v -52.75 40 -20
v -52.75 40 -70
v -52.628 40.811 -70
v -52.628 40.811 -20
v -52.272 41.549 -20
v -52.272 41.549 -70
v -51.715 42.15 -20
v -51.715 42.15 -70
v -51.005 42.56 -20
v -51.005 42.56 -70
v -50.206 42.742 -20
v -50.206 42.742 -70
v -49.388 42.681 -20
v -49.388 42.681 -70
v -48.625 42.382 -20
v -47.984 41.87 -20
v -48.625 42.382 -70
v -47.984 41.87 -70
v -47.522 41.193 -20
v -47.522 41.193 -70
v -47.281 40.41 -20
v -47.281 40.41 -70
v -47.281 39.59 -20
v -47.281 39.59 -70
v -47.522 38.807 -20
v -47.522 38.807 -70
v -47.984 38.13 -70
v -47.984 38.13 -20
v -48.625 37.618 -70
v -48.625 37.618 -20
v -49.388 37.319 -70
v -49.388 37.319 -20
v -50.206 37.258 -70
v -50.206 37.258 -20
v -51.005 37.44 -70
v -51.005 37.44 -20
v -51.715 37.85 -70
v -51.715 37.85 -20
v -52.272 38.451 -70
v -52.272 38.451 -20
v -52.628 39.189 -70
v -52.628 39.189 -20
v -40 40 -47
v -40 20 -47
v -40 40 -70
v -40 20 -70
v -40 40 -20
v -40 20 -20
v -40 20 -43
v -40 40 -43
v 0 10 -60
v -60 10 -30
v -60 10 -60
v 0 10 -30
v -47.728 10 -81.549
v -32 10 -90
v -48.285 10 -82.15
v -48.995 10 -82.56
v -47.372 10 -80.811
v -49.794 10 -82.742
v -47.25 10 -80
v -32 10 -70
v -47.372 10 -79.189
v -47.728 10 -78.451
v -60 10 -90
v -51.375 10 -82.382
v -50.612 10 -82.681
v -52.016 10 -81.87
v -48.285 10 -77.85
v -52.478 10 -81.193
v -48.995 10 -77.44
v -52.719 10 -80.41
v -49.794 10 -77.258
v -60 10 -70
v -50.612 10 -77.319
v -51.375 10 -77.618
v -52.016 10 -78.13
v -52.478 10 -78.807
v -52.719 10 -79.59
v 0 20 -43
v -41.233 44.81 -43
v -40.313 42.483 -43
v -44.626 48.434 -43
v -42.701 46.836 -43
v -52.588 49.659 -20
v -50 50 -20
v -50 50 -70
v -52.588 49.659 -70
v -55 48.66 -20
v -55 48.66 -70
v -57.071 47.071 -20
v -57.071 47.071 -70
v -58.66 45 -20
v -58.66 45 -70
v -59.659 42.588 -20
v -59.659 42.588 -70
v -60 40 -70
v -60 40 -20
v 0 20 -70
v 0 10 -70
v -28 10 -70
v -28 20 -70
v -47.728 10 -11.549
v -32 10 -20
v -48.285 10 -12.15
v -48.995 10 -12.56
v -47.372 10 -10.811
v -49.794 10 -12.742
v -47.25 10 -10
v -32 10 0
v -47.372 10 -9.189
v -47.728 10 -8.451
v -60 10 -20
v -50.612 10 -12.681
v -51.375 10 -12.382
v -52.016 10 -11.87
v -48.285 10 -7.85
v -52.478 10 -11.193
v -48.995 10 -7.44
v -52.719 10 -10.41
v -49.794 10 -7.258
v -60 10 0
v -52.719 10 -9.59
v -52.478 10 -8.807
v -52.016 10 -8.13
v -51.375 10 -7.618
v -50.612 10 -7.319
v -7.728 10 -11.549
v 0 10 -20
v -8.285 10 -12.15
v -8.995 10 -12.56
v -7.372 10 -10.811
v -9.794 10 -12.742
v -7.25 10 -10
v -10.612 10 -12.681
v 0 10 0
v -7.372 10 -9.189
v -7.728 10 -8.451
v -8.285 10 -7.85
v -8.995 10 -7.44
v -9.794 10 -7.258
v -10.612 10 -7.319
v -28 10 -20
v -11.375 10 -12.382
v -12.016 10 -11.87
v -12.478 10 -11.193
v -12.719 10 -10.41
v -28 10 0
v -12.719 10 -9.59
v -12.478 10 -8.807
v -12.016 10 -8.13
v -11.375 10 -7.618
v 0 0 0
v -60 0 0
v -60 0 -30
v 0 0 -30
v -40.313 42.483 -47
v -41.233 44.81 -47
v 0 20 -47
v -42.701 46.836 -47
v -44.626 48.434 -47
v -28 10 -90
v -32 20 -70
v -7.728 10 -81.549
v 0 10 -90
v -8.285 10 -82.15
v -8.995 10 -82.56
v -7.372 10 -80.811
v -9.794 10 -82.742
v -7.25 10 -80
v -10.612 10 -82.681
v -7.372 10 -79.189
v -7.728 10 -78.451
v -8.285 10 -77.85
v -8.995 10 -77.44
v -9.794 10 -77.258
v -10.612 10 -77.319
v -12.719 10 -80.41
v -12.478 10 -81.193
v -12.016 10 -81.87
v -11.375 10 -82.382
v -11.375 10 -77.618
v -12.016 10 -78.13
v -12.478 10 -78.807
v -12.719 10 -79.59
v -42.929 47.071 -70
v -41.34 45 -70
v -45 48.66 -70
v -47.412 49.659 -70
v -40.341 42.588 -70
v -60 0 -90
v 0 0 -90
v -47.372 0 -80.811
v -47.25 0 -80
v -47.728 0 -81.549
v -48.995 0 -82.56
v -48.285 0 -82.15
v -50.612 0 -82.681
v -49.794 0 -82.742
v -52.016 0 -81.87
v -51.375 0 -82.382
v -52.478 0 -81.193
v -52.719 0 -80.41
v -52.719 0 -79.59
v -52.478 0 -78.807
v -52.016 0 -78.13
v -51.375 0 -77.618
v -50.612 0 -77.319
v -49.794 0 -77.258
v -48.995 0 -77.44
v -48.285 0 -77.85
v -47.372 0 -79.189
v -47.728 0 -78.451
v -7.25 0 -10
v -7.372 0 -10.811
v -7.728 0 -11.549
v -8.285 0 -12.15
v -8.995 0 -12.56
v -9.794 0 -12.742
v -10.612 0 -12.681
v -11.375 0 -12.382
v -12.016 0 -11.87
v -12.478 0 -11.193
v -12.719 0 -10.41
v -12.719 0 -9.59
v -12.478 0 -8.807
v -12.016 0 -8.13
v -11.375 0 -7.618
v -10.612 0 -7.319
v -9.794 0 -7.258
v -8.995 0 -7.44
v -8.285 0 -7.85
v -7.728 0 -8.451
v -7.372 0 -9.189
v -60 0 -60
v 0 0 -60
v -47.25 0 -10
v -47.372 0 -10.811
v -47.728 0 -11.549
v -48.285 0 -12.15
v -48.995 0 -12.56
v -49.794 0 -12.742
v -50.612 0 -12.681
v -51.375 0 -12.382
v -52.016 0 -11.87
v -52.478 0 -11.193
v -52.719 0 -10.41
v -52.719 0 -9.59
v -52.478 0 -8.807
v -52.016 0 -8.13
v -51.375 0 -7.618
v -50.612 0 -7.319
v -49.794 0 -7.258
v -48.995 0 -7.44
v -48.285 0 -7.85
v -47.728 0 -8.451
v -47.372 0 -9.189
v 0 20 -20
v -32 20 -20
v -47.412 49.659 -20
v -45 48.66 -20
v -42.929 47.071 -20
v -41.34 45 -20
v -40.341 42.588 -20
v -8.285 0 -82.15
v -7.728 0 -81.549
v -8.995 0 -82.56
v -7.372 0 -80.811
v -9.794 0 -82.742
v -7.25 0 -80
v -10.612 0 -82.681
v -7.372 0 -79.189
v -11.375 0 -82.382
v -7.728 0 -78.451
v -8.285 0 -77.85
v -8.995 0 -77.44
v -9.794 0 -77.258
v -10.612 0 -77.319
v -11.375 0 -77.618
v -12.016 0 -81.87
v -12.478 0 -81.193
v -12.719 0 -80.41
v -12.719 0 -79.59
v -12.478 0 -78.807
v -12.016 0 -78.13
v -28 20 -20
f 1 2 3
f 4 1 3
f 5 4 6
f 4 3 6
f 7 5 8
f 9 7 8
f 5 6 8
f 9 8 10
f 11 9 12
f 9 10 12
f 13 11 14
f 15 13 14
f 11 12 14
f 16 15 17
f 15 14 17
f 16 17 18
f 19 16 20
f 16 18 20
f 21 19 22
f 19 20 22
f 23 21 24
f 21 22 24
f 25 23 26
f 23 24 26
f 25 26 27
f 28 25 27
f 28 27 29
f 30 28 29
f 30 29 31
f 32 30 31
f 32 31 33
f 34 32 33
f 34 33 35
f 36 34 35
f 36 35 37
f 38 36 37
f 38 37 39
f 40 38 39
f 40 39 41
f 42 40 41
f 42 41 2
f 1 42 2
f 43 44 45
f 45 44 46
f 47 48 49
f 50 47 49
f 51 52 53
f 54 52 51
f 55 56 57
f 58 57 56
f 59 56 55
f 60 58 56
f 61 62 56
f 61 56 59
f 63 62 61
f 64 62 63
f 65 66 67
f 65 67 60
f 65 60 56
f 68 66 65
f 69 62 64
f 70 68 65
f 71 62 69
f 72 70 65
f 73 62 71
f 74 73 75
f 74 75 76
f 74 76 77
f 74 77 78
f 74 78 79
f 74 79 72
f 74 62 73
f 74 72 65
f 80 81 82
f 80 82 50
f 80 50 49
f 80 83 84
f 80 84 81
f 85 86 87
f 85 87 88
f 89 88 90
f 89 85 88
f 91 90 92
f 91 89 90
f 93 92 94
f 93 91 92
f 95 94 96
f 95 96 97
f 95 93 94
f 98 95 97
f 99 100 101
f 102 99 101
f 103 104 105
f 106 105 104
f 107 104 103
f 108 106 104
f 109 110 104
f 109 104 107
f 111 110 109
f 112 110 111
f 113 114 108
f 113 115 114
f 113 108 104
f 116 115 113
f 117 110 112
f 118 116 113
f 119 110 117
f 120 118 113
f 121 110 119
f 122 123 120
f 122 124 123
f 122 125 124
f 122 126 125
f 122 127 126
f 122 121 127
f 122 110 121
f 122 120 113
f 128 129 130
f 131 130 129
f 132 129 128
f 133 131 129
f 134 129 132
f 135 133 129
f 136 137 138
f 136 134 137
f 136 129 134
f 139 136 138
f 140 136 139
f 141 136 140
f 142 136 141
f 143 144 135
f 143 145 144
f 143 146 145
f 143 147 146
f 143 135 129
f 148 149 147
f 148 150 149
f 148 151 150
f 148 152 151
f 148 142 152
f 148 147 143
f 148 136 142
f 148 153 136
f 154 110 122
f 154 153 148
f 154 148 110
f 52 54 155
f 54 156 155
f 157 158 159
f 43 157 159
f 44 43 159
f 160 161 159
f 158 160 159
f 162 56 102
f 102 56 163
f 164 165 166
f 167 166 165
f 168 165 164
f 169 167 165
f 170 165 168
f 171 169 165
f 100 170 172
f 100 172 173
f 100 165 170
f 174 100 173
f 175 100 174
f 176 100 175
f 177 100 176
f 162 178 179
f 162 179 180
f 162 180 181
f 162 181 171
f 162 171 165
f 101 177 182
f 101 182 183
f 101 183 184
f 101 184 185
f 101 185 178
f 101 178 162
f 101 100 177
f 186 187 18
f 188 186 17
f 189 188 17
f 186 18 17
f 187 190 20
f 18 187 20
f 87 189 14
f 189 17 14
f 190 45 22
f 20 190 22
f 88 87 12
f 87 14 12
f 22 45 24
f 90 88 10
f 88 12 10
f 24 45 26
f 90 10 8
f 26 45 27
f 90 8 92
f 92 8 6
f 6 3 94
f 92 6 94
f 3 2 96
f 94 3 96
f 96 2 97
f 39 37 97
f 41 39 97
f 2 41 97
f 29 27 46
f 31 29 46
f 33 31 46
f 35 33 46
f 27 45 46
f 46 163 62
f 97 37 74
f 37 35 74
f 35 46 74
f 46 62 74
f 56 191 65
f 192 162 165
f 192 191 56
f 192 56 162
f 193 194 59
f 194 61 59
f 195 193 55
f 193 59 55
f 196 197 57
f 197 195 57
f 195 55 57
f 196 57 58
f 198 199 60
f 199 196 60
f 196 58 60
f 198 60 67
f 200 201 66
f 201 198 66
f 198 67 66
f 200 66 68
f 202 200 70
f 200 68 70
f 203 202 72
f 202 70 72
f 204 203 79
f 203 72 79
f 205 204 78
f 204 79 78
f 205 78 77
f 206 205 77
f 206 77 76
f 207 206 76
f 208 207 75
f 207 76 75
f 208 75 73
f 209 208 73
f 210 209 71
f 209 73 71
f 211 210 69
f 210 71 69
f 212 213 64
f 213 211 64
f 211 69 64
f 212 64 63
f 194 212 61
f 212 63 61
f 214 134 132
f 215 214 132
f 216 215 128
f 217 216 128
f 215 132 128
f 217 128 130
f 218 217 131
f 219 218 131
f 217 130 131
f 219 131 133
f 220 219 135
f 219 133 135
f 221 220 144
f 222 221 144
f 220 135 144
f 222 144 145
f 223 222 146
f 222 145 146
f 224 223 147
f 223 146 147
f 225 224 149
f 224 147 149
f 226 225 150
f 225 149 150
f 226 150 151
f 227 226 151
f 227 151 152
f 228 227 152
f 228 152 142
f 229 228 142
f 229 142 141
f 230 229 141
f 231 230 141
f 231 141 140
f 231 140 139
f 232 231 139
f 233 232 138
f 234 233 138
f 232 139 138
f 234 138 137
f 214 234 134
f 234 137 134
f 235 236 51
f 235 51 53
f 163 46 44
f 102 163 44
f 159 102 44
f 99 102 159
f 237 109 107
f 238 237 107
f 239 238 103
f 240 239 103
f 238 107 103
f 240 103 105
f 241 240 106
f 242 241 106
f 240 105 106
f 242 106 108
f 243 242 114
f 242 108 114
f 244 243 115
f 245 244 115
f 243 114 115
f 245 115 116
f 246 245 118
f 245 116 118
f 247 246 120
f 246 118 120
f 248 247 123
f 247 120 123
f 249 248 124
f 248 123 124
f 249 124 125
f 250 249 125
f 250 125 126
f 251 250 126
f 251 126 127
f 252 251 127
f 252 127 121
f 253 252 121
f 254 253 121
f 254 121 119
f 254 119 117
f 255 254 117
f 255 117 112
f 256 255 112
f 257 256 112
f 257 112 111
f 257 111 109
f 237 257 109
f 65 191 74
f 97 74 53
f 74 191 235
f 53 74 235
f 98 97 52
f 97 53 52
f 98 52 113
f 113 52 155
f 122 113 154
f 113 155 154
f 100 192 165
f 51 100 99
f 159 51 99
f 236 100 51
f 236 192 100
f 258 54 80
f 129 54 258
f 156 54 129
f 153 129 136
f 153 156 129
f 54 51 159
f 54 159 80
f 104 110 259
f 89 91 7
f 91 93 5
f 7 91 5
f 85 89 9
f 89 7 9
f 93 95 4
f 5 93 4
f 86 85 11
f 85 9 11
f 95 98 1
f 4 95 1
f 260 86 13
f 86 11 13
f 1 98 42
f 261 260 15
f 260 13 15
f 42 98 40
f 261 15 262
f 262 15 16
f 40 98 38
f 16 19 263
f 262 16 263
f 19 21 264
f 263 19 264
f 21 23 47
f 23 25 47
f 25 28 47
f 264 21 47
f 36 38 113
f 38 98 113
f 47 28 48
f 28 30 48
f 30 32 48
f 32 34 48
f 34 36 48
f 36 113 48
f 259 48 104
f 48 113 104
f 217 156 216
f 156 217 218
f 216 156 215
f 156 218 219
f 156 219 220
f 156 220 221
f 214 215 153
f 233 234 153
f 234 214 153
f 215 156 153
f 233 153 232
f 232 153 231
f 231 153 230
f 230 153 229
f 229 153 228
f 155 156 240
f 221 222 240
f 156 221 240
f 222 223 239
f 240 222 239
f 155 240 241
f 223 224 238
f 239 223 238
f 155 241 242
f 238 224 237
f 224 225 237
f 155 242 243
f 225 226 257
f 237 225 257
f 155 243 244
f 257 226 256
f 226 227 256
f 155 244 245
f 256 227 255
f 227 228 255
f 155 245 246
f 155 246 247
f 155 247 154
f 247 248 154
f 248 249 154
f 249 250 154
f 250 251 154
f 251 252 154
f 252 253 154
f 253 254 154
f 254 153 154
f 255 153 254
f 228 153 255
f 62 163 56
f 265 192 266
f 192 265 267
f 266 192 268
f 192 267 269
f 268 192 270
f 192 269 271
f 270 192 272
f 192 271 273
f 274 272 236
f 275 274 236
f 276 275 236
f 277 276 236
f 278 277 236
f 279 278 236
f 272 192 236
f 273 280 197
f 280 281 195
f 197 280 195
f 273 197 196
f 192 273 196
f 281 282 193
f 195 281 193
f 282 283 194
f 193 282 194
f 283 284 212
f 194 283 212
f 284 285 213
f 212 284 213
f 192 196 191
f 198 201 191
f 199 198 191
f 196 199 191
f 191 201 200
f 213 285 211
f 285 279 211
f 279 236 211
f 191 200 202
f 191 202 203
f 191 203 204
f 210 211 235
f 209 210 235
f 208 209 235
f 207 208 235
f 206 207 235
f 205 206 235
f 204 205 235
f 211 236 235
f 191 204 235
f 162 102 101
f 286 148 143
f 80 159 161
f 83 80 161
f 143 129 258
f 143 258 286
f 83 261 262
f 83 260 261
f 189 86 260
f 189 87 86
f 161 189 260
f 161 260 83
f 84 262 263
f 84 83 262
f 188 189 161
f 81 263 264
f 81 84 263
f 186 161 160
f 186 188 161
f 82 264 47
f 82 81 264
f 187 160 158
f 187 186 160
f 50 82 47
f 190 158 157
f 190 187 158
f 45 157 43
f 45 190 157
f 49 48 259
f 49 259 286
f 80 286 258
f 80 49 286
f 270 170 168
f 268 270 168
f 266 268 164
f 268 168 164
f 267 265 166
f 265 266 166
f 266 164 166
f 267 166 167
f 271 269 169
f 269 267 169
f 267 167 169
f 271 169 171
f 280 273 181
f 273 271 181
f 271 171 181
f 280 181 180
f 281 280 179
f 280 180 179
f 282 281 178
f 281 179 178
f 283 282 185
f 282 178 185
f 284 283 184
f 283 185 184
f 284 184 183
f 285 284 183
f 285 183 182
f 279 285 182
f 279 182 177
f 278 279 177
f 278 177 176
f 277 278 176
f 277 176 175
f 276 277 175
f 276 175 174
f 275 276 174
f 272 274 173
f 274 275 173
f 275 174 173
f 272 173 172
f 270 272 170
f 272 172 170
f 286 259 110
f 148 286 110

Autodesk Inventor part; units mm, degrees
sketch "Sketch1" plane through (0, 0, 0) normal (0, 1, 0) x (-1, 0, 0)
  line L0 (0, 0) -> (60, 0)
  line L1 (60, 0) -> (60, -90)
  line L2 (60, -90) -> (0, -90)
  line L3 (0, -90) -> (0, 0)
  dimension "d0" = 60
  dimension "d1" = 90
extrude "Extrusion1" add sketch "Sketch1" along normal blind 10
sketch "Sketch2" plane through (0, 10, 0) normal (0, 1, 0) x (1, 0, 0)
  line L0 (0, 20) -> (-60, 20)
  line L1 (0, 70) -> (-60, 70)
  line L2 (-60, 70) -> (-60, 20)
  line L3 (0, 20) -> (0, 70)
  point P0 (0, 0)
extrude "Extrusion2" add sketch "Sketch2" along normal blind 10
sketch "Sketch3" plane through (0, 0, 0) normal (0, -1, 0) x (1, 0, 0)
  line L0 (0, -30) -> (-60, -30)
  line L1 (-60, -30) -> (-60, -60)
  line L2 (0, -90) -> (0, -60)
  line L3 (0, -60) -> (-60, -60)
  line L4 (0, -60) -> (0, -30)
  dimension "d9" = 30
extrude "Extrusion3" cut sketch "Sketch3" against normal blind 10
sketch "Sketch4" plane through (0, 10, 0) normal (0, 1, 0) x (1, 0, 0)
  circle A0 centre (-10, 10) radius 2.75
  circle A1 centre (-50, 10) radius 2.75
  dimension "d13" = 5.5
  dimension "d14" = 5.5
extrude "Extrusion4" cut sketch "Sketch4" against normal blind 10
ref_plane "Work Plane1" through (-30, 0, -90) normal (1, 0, 0) x (0, 0, -1)
sketch "Sketch5" plane through (-30, 0, -90) normal (1, 0, 0) x (0, 0, -1)
  line L0 (-70, 10) -> (-70, 20) projected
  line L1 (-90, 10) -> (-70, 10) projected
  line L2 (-70, 20) -> (-90, 10)
  line L3 (-90, 10) -> (-70, 10)
  line L4 (-70, 10) -> (-70, 20)
  point P0 (-90, 0)
extrude "Extrusion5" add sketch "Sketch5" along normal mid plane 4
ref_plane "Work Plane2" through (-60, 0, -45) normal (0, 0, 1) x (1, 0, 0)
mirror "Mirror1" about plane through (-60, 0, -45) normal (0, 0, 1) of "Extrusion4", "Extrusion5"
sketch "Sketch6" plane through (0, 20, 0) normal (0, 1, 0) x (1, 0, 0)
  line L0 (-32, 70) -> (-60, 70) projected
  line L1 (-40, 20) -> (-40, 70)
  line L2 (-60, 70) -> (-40, 70)
  line L3 (-60, 70) -> (-60, 20)
  line L4 (-60, 20) -> (-40, 20)
  point P0 (0, 0)
  point P1 (0, 20)
extrude "Extrusion6" add sketch "Sketch6" along normal blind 30
fillet "Fillet1" radius 10 2 edges at (-40, 50, -45) (-60, 50, -45)
sketch "Sketch7" plane through (-32, 10, -70) normal (0, 0, -1) x (-1, 0, 0)
  arc A0 (28, 30) -> (8, 30) centre (18, 30) ccw projected
  circle A1 centre (18, 30) radius 2.75
  point P0 (-32, -10)
  dimension "d24" = 5.5
extrude "Extrusion7" cut sketch "Sketch7" against normal blind 50
ref_plane "Work Plane3" through (-60, 10, -45) normal (0, 0, 1) x (1, 0, 0)
sketch "Sketch8" plane through (-60, 10, -45) normal (0, 0, 1) x (1, 0, 0)
  line L0 (32, 10) -> (60, 10) projected
  line L1 (60, 10) -> (15.3735, 38.4336)
  arc A0 (20, 30) -> (0, 30) centre (10, 30) ccw projected
  line L2 (15.3735, 38.4336) -> (15.3735, 10)
  line L3 (15.3735, 10) -> (60, 10)
  point P0 (60, -10)
extrude "Extrusion8" add sketch "Sketch8" along normal mid plane 4
properties part number "MMAE 232 Assignment 1_Part 1 - Dylan Tamras"
